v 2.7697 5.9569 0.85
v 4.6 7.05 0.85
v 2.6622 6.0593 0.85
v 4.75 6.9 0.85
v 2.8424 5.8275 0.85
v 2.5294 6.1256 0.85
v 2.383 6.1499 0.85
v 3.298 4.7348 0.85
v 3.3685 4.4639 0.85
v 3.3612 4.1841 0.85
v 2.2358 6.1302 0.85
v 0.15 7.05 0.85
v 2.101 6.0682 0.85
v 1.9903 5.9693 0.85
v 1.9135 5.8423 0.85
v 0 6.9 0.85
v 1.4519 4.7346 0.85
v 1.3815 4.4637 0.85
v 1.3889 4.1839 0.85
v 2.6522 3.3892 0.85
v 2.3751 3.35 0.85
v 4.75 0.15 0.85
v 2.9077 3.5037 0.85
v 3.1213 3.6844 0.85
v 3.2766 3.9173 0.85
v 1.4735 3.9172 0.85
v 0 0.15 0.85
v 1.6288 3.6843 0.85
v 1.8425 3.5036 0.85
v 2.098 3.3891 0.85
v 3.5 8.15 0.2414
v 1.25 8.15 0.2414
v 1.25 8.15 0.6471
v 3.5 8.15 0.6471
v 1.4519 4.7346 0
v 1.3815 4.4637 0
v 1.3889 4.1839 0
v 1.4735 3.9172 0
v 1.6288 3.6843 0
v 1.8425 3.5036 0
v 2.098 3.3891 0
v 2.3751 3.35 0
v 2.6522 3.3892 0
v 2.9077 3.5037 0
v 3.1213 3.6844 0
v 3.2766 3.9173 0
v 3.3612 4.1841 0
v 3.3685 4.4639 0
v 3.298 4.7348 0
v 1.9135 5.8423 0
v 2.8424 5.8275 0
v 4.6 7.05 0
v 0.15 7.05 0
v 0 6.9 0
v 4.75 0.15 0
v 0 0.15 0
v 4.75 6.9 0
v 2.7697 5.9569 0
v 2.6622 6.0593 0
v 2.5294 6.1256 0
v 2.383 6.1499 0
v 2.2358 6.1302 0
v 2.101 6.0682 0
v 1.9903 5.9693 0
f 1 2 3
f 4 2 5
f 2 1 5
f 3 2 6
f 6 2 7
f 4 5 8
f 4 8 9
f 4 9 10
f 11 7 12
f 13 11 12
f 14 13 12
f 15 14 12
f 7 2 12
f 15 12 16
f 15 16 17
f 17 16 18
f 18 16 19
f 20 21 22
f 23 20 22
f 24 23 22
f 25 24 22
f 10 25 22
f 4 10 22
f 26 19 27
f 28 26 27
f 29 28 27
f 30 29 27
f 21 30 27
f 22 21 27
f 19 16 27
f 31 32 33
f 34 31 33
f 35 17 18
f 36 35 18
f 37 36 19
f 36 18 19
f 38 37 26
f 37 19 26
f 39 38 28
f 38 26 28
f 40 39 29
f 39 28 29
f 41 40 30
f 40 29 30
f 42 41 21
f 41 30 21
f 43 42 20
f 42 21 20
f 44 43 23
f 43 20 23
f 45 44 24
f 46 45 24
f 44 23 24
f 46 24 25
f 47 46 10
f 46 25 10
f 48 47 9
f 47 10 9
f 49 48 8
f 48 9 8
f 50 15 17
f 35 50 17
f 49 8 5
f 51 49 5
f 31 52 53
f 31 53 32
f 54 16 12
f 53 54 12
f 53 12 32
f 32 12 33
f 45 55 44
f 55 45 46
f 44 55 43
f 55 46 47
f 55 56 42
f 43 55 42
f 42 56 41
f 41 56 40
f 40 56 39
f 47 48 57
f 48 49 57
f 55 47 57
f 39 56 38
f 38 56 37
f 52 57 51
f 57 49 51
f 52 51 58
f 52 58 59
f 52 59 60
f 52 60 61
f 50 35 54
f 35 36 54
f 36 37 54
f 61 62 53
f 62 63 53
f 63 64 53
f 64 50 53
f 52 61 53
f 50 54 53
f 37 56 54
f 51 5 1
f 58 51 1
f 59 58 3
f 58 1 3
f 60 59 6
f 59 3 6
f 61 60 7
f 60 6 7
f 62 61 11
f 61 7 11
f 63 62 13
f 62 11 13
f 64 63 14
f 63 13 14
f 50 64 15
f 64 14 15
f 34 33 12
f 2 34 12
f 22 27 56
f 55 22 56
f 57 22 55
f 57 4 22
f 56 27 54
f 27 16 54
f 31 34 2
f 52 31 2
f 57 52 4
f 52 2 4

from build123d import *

# Parameters (mm, degrees)
BOSS_EXTRUDE1_DEPTH = 4.75
CUT_EXTRUDE1_REACH  = 11.471
CUT_EXTRUDE2_DEPTH  = 0.85


with BuildPart() as part:
    # Sketch1 → Boss-Extrude1 (new body)
    with BuildSketch(Plane(origin=(0, 0, 0), x_dir=(0, 0, -1), z_dir=(1, 0, 0))):
        Polygon((0, 0.15), (0, 7.05), (-0.241393443, 8.15), (-0.647131148, 8.15), (-0.85, 7.05), (-0.85, 0.15), align=None)
    extrude(amount=BOSS_EXTRUDE1_DEPTH)

    # Cut-Extrude1: up to this face of the body (flat: up to its plane)
    cut_extrude1_end = Plane(part.part.faces().sort_by_distance((2.375, 3.6, 0))[0])
    # Sketch4 → Cut-Extrude1 (cut, up to the picked face)
    with BuildSketch(Plane.XY.offset(0.85), mode=Mode.PRIVATE) as cut_extrude1_sk1:
        Polygon((0, 6.9), (1.25, 8.15), (0, 8.15), align=None)
    cut_extrude1_tool1 = split(extrude(cut_extrude1_sk1.sketch, amount=-CUT_EXTRUDE1_REACH, mode=Mode.PRIVATE), bisect_by=cut_extrude1_end, keep=Keep.BOTH, mode=Mode.PRIVATE)
    # Sketch4 → Cut-Extrude1 (cut, up to the picked face)
    with BuildSketch(Plane.XY.offset(0.85), mode=Mode.PRIVATE) as cut_extrude1_sk2:
        Polygon((3.5, 8.15), (4.75, 6.9), (4.75, 8.15), align=None)
    cut_extrude1_tool2 = split(extrude(cut_extrude1_sk2.sketch, amount=-CUT_EXTRUDE1_REACH, mode=Mode.PRIVATE), bisect_by=cut_extrude1_end, keep=Keep.BOTH, mode=Mode.PRIVATE)
    add(cut_extrude1_tool1.solids().sort_by(Axis((0.416667, 7.733333, 0.85), (0, 0, -1)))[0], mode=Mode.SUBTRACT)
    add(cut_extrude1_tool2.solids().sort_by(Axis((4.333333, 7.733333, 0.85), (0, 0, -1)))[0], mode=Mode.SUBTRACT)

    # Sketch5 → Cut-Extrude2 (cut)
    with BuildSketch(Plane.XY.offset(0.85)):
        with BuildLine():
            Line((1.913461538, 5.842307692), (1.451923077, 4.734615385))
            ThreePointArc((1.451923077, 4.734615385), (2.37510742, 3.350000006), (3.297994271, 4.734813689))
            Line((3.297994271, 4.734813689), (2.842436975, 5.827489929))
            ThreePointArc((2.842436975, 5.827489929), (2.382974312, 6.149936406), (1.913461538, 5.842307692))
        make_face()
    extrude(amount=-CUT_EXTRUDE2_DEPTH, mode=Mode.SUBTRACT)


solid = part.part
